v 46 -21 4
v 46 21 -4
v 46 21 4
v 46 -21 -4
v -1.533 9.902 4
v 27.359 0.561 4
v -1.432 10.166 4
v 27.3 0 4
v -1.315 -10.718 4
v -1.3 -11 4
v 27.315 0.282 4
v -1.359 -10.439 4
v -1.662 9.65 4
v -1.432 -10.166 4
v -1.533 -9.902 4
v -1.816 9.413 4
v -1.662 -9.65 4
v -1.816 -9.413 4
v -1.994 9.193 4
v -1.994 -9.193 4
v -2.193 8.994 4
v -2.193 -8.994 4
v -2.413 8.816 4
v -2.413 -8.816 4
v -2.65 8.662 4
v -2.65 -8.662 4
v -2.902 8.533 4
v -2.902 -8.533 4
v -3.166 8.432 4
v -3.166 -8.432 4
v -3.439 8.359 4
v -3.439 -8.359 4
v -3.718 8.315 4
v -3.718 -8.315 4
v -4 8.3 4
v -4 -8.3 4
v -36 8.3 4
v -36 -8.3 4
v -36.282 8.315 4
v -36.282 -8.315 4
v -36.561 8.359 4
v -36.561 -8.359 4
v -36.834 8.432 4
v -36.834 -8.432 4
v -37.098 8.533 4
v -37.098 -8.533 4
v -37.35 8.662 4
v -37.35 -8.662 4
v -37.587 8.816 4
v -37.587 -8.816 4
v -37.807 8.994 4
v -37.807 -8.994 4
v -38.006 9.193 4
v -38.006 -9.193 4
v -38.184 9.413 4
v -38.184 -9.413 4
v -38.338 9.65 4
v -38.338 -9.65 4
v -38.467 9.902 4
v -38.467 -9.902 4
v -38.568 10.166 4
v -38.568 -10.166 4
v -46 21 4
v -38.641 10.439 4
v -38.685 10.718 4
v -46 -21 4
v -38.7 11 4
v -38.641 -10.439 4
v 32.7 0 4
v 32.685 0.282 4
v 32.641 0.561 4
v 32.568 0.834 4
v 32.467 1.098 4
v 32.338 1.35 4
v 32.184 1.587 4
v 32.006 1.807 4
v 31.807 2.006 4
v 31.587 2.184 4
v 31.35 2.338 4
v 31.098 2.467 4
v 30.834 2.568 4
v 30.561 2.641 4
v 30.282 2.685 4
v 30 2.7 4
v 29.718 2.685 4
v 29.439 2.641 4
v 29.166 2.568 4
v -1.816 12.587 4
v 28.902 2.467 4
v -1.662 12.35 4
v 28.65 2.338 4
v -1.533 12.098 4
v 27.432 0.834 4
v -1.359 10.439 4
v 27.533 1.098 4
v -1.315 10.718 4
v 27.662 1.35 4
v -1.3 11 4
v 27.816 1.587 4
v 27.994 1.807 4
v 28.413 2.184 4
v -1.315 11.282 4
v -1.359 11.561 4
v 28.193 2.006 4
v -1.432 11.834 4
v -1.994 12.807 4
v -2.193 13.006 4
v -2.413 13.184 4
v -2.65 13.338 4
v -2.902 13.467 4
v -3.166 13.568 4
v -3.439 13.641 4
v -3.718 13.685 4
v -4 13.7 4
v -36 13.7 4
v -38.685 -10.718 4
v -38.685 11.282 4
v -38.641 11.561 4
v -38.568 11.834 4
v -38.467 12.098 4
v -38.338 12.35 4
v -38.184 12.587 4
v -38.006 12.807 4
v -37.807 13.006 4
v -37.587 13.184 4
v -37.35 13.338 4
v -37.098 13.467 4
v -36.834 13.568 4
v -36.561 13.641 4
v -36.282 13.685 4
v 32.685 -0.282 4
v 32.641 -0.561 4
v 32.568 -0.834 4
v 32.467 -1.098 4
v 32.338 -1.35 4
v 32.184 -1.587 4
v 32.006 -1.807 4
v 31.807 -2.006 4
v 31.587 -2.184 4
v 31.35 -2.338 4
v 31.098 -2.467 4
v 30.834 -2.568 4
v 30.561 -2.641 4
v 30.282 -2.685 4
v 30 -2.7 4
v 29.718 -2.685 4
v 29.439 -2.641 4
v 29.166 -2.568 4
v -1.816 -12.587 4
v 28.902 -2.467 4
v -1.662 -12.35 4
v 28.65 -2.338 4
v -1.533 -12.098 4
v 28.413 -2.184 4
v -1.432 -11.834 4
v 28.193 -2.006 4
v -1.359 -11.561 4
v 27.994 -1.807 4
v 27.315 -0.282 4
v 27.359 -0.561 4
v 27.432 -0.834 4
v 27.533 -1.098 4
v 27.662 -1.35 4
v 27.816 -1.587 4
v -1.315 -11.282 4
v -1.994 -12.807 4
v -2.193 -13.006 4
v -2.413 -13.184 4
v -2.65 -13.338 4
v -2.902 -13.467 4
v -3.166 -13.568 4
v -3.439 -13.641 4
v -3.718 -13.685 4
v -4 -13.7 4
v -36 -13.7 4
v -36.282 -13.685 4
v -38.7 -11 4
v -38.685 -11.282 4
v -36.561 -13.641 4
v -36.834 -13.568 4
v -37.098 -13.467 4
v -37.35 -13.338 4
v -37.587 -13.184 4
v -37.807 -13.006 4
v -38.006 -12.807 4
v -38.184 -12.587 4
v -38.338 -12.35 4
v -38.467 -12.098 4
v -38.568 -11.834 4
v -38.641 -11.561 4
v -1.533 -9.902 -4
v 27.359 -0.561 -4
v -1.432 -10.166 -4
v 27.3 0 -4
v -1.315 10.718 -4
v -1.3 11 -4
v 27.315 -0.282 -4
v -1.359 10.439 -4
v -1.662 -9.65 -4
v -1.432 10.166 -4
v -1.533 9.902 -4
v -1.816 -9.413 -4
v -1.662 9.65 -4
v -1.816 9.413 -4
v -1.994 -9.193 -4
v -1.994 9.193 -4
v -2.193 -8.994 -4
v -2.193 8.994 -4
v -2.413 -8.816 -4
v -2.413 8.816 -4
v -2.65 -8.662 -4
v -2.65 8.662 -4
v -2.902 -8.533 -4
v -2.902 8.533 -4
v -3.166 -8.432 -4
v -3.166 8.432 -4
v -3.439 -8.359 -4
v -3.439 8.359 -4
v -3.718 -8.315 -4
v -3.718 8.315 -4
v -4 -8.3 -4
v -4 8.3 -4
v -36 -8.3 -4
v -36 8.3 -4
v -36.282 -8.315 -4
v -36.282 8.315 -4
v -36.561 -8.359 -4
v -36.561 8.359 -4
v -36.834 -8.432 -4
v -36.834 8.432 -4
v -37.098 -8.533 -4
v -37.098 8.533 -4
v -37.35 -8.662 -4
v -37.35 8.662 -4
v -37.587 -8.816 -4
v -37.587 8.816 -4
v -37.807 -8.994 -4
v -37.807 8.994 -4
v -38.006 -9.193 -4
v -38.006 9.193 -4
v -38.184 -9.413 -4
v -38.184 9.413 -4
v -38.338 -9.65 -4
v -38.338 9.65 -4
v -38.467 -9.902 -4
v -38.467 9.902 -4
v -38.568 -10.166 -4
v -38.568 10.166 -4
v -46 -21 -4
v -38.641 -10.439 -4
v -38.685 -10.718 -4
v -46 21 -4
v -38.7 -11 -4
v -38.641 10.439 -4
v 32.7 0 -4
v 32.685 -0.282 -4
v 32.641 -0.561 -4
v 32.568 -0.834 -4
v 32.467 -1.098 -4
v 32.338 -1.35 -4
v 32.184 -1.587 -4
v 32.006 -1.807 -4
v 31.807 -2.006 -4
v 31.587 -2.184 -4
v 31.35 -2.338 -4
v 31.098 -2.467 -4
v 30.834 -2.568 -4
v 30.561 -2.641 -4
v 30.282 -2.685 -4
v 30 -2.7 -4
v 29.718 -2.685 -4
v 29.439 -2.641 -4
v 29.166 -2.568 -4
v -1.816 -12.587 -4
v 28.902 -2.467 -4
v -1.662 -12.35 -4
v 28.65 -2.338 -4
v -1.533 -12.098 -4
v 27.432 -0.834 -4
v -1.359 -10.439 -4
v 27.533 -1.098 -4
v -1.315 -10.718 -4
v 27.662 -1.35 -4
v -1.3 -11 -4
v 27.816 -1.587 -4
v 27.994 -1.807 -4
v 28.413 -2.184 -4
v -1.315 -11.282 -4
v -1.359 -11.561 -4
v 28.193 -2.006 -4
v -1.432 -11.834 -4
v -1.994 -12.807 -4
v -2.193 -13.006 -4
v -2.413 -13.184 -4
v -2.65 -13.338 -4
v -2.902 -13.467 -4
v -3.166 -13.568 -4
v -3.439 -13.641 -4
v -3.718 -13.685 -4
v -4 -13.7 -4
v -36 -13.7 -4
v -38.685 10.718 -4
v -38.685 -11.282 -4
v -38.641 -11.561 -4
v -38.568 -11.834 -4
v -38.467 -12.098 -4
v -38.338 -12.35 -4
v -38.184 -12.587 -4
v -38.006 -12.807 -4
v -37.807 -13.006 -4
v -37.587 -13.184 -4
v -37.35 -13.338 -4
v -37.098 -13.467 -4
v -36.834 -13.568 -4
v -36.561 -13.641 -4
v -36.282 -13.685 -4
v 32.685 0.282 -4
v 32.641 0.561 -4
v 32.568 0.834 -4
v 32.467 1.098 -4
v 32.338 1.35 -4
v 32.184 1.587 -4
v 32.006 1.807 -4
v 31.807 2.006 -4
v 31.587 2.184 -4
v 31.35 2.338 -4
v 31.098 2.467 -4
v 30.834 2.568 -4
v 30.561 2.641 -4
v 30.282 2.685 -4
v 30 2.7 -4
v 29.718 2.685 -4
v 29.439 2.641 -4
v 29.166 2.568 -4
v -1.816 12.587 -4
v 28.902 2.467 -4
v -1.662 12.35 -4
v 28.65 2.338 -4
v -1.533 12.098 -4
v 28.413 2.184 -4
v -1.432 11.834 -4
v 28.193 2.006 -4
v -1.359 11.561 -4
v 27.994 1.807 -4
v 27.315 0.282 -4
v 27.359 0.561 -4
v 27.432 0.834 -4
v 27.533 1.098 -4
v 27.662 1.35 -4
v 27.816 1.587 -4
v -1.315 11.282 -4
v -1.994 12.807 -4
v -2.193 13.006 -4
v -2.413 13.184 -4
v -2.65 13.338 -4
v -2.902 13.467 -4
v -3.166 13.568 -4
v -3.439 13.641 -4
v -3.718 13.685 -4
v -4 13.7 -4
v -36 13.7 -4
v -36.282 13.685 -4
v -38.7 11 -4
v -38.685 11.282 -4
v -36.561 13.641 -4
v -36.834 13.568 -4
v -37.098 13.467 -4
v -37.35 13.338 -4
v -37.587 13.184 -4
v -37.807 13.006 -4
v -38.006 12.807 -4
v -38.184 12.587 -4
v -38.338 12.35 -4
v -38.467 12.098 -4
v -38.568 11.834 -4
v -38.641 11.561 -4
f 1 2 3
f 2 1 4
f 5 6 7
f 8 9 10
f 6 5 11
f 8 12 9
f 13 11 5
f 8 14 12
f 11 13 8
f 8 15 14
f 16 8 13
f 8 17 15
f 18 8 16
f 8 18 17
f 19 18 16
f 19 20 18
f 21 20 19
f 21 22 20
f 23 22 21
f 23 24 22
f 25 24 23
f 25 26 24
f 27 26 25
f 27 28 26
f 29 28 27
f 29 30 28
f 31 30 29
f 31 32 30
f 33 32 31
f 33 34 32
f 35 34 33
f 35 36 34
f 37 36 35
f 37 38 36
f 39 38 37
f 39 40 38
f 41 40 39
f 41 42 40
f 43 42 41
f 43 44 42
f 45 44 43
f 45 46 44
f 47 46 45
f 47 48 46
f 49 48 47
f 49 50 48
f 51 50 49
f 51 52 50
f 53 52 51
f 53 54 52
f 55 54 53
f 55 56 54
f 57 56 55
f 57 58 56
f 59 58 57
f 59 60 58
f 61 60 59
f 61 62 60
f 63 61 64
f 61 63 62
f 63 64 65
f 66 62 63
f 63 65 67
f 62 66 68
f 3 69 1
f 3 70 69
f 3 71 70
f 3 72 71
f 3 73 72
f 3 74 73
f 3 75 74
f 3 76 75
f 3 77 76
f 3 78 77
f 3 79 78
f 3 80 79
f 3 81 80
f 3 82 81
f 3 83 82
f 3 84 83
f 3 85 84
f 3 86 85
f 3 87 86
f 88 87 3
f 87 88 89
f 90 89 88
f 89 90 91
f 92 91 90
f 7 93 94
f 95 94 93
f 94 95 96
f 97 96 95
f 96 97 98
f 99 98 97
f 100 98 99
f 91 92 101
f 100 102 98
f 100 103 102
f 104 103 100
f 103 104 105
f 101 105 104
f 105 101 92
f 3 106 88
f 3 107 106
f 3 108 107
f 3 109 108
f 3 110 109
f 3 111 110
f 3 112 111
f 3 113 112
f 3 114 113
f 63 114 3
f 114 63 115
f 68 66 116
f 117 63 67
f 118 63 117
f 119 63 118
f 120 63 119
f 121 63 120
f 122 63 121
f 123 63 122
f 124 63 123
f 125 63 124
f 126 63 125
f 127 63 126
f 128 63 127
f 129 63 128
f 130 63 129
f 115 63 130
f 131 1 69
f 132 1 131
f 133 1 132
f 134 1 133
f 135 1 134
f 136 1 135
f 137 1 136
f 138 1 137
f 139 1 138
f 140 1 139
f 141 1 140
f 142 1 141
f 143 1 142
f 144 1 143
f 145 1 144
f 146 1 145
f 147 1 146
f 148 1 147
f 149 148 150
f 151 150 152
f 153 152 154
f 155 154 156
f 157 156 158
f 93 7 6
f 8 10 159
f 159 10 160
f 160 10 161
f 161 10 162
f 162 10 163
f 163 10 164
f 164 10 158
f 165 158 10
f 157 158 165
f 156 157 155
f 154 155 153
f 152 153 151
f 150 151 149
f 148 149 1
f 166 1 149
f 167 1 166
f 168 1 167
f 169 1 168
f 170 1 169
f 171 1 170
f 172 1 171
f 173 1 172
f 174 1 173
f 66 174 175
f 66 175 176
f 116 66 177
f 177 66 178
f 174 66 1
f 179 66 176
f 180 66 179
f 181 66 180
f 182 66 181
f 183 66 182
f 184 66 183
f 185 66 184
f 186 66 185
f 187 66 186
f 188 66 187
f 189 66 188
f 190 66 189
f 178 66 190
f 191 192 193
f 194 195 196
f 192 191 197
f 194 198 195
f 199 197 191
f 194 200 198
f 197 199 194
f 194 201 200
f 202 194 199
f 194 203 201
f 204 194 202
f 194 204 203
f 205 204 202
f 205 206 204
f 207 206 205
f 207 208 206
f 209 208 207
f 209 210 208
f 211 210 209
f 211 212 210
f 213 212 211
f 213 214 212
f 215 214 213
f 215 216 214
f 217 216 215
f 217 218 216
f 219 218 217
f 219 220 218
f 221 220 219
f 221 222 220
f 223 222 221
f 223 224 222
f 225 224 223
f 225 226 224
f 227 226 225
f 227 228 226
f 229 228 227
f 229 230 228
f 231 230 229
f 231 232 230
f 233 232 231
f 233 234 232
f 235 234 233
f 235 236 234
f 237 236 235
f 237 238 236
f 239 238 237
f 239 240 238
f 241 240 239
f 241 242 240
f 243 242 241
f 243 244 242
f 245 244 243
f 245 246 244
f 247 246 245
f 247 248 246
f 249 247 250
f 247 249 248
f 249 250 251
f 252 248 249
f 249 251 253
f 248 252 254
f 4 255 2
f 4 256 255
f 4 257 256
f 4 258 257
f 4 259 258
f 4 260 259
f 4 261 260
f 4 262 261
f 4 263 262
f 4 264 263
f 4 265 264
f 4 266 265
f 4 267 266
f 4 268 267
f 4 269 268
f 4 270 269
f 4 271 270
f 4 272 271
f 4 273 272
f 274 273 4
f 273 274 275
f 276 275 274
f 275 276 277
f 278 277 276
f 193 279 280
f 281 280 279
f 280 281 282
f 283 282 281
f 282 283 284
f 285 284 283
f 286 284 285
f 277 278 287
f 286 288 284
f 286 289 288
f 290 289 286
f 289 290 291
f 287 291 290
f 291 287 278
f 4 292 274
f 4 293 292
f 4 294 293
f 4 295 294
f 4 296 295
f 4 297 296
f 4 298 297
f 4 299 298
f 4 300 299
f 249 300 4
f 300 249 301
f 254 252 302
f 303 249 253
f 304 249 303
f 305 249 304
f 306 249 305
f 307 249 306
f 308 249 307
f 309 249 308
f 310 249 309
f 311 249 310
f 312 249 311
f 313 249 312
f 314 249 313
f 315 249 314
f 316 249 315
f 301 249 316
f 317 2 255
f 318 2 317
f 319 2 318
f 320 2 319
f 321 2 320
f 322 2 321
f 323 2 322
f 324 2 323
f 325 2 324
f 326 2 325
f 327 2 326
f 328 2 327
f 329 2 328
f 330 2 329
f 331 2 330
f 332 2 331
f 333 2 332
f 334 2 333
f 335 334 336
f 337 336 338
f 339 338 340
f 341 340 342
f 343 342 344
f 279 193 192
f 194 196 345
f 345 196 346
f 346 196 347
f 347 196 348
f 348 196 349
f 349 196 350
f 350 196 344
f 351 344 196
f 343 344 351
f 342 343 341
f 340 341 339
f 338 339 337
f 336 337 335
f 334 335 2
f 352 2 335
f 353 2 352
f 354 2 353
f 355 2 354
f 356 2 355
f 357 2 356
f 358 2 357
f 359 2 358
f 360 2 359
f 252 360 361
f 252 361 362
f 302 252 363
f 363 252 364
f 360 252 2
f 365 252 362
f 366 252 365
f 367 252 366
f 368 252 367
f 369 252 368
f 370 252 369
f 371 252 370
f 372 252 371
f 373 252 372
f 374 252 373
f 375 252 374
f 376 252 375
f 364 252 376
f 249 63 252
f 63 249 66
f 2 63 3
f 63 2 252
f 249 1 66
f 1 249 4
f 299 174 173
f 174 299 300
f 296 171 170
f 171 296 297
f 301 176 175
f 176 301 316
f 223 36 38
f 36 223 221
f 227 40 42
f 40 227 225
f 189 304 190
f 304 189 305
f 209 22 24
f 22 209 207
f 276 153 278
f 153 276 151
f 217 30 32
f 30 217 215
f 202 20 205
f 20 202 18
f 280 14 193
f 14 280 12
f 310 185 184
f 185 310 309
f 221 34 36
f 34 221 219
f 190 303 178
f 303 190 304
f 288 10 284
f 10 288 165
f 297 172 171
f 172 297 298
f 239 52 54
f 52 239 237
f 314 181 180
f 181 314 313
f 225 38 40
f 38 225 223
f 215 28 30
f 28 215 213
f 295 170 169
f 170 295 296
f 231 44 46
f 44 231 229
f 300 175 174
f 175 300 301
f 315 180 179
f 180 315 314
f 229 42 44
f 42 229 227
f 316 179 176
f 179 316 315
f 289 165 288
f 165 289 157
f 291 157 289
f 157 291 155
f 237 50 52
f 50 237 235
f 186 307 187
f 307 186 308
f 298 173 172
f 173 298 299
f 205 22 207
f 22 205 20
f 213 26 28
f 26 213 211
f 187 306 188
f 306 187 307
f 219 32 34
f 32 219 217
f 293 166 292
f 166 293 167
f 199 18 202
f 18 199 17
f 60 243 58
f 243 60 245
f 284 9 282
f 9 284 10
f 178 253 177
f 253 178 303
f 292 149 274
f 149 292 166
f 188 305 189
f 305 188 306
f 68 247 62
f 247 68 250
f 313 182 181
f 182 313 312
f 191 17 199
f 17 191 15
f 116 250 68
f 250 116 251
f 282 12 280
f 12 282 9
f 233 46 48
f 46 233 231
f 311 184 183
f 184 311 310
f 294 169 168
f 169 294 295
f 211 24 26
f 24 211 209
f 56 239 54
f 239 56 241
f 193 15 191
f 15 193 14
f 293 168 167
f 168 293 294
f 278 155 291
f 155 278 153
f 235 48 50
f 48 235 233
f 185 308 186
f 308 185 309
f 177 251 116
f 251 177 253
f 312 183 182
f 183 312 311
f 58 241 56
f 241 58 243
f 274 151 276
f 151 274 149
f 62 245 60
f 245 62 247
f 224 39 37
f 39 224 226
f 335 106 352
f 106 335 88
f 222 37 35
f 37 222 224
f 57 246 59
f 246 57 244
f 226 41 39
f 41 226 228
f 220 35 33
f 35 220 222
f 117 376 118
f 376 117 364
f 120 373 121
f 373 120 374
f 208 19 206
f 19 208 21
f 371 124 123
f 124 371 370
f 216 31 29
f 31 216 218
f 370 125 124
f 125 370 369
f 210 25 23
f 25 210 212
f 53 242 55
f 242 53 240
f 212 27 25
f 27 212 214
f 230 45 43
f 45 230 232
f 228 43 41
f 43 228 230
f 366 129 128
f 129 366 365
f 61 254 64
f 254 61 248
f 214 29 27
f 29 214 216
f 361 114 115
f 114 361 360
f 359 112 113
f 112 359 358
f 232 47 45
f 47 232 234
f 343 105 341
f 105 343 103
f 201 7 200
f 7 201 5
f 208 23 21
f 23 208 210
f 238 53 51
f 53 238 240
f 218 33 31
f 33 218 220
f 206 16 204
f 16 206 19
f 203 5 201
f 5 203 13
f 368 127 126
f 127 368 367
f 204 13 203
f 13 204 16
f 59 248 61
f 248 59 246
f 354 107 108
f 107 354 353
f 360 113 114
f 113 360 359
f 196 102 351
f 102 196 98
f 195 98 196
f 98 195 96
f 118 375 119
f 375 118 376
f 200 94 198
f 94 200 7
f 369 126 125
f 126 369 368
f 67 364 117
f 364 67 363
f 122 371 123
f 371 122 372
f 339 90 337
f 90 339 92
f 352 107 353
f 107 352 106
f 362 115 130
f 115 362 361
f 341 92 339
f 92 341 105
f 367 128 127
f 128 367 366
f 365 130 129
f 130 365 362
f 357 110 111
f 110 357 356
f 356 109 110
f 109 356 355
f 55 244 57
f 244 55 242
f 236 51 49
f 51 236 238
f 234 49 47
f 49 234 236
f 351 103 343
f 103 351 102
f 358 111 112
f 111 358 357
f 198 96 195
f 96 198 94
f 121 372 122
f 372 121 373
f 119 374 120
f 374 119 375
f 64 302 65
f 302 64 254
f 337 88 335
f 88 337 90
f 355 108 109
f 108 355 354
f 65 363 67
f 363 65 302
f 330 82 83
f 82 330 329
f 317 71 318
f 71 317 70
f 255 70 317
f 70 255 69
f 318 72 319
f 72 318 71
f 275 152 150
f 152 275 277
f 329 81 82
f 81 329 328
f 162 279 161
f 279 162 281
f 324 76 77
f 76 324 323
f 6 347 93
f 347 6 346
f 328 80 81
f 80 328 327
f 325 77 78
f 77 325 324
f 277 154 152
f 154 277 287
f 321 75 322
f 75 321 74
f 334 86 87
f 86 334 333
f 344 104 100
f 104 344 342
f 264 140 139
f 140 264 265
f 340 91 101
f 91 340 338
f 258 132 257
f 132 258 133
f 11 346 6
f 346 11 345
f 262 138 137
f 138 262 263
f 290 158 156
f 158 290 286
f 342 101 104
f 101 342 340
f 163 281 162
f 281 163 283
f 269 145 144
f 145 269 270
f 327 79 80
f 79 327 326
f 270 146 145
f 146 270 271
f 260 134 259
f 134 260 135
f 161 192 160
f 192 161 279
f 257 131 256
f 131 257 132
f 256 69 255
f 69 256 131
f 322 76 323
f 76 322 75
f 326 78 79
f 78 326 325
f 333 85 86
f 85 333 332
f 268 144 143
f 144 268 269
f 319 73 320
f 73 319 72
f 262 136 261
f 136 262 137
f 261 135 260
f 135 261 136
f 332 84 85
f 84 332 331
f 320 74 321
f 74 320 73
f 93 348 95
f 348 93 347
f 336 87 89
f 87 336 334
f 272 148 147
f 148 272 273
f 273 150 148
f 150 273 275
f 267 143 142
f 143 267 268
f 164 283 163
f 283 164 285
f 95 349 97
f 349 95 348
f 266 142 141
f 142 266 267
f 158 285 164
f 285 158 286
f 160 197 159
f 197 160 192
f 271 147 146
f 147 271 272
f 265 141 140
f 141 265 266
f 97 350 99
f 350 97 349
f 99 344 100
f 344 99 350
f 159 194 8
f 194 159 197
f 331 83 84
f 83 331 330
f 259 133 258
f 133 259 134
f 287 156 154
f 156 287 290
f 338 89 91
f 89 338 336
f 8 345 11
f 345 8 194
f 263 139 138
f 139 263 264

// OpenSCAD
// GT2 tensioner slide 9 mm: GT2 idler tensioner slide for a 9 mm belt.
$fn = 60;
eps = 0.02;
slide_l = 92;
slide_w = 42;
slide_t = 8;
belt_w = 9;
mount_slot_l = 32;
mount_d = 5.4;
axle_d = 5.4;
axle_x = 30;

module horizontal_slot(x, y) {
    hull() {
        translate([x - mount_slot_l / 2, y, -slide_t / 2 - eps]) cylinder(d = mount_d, h = slide_t + 2 * eps);
        translate([x + mount_slot_l / 2, y, -slide_t / 2 - eps]) cylinder(d = mount_d, h = slide_t + 2 * eps);
    }
}

difference() {
    cube([slide_l, slide_w, slide_t], center = true);
    horizontal_slot(-20, -11);
    horizontal_slot(-20, 11);
    translate([axle_x, 0, -slide_t / 2 - eps]) cylinder(d = axle_d, h = slide_t + 2 * eps);
}
